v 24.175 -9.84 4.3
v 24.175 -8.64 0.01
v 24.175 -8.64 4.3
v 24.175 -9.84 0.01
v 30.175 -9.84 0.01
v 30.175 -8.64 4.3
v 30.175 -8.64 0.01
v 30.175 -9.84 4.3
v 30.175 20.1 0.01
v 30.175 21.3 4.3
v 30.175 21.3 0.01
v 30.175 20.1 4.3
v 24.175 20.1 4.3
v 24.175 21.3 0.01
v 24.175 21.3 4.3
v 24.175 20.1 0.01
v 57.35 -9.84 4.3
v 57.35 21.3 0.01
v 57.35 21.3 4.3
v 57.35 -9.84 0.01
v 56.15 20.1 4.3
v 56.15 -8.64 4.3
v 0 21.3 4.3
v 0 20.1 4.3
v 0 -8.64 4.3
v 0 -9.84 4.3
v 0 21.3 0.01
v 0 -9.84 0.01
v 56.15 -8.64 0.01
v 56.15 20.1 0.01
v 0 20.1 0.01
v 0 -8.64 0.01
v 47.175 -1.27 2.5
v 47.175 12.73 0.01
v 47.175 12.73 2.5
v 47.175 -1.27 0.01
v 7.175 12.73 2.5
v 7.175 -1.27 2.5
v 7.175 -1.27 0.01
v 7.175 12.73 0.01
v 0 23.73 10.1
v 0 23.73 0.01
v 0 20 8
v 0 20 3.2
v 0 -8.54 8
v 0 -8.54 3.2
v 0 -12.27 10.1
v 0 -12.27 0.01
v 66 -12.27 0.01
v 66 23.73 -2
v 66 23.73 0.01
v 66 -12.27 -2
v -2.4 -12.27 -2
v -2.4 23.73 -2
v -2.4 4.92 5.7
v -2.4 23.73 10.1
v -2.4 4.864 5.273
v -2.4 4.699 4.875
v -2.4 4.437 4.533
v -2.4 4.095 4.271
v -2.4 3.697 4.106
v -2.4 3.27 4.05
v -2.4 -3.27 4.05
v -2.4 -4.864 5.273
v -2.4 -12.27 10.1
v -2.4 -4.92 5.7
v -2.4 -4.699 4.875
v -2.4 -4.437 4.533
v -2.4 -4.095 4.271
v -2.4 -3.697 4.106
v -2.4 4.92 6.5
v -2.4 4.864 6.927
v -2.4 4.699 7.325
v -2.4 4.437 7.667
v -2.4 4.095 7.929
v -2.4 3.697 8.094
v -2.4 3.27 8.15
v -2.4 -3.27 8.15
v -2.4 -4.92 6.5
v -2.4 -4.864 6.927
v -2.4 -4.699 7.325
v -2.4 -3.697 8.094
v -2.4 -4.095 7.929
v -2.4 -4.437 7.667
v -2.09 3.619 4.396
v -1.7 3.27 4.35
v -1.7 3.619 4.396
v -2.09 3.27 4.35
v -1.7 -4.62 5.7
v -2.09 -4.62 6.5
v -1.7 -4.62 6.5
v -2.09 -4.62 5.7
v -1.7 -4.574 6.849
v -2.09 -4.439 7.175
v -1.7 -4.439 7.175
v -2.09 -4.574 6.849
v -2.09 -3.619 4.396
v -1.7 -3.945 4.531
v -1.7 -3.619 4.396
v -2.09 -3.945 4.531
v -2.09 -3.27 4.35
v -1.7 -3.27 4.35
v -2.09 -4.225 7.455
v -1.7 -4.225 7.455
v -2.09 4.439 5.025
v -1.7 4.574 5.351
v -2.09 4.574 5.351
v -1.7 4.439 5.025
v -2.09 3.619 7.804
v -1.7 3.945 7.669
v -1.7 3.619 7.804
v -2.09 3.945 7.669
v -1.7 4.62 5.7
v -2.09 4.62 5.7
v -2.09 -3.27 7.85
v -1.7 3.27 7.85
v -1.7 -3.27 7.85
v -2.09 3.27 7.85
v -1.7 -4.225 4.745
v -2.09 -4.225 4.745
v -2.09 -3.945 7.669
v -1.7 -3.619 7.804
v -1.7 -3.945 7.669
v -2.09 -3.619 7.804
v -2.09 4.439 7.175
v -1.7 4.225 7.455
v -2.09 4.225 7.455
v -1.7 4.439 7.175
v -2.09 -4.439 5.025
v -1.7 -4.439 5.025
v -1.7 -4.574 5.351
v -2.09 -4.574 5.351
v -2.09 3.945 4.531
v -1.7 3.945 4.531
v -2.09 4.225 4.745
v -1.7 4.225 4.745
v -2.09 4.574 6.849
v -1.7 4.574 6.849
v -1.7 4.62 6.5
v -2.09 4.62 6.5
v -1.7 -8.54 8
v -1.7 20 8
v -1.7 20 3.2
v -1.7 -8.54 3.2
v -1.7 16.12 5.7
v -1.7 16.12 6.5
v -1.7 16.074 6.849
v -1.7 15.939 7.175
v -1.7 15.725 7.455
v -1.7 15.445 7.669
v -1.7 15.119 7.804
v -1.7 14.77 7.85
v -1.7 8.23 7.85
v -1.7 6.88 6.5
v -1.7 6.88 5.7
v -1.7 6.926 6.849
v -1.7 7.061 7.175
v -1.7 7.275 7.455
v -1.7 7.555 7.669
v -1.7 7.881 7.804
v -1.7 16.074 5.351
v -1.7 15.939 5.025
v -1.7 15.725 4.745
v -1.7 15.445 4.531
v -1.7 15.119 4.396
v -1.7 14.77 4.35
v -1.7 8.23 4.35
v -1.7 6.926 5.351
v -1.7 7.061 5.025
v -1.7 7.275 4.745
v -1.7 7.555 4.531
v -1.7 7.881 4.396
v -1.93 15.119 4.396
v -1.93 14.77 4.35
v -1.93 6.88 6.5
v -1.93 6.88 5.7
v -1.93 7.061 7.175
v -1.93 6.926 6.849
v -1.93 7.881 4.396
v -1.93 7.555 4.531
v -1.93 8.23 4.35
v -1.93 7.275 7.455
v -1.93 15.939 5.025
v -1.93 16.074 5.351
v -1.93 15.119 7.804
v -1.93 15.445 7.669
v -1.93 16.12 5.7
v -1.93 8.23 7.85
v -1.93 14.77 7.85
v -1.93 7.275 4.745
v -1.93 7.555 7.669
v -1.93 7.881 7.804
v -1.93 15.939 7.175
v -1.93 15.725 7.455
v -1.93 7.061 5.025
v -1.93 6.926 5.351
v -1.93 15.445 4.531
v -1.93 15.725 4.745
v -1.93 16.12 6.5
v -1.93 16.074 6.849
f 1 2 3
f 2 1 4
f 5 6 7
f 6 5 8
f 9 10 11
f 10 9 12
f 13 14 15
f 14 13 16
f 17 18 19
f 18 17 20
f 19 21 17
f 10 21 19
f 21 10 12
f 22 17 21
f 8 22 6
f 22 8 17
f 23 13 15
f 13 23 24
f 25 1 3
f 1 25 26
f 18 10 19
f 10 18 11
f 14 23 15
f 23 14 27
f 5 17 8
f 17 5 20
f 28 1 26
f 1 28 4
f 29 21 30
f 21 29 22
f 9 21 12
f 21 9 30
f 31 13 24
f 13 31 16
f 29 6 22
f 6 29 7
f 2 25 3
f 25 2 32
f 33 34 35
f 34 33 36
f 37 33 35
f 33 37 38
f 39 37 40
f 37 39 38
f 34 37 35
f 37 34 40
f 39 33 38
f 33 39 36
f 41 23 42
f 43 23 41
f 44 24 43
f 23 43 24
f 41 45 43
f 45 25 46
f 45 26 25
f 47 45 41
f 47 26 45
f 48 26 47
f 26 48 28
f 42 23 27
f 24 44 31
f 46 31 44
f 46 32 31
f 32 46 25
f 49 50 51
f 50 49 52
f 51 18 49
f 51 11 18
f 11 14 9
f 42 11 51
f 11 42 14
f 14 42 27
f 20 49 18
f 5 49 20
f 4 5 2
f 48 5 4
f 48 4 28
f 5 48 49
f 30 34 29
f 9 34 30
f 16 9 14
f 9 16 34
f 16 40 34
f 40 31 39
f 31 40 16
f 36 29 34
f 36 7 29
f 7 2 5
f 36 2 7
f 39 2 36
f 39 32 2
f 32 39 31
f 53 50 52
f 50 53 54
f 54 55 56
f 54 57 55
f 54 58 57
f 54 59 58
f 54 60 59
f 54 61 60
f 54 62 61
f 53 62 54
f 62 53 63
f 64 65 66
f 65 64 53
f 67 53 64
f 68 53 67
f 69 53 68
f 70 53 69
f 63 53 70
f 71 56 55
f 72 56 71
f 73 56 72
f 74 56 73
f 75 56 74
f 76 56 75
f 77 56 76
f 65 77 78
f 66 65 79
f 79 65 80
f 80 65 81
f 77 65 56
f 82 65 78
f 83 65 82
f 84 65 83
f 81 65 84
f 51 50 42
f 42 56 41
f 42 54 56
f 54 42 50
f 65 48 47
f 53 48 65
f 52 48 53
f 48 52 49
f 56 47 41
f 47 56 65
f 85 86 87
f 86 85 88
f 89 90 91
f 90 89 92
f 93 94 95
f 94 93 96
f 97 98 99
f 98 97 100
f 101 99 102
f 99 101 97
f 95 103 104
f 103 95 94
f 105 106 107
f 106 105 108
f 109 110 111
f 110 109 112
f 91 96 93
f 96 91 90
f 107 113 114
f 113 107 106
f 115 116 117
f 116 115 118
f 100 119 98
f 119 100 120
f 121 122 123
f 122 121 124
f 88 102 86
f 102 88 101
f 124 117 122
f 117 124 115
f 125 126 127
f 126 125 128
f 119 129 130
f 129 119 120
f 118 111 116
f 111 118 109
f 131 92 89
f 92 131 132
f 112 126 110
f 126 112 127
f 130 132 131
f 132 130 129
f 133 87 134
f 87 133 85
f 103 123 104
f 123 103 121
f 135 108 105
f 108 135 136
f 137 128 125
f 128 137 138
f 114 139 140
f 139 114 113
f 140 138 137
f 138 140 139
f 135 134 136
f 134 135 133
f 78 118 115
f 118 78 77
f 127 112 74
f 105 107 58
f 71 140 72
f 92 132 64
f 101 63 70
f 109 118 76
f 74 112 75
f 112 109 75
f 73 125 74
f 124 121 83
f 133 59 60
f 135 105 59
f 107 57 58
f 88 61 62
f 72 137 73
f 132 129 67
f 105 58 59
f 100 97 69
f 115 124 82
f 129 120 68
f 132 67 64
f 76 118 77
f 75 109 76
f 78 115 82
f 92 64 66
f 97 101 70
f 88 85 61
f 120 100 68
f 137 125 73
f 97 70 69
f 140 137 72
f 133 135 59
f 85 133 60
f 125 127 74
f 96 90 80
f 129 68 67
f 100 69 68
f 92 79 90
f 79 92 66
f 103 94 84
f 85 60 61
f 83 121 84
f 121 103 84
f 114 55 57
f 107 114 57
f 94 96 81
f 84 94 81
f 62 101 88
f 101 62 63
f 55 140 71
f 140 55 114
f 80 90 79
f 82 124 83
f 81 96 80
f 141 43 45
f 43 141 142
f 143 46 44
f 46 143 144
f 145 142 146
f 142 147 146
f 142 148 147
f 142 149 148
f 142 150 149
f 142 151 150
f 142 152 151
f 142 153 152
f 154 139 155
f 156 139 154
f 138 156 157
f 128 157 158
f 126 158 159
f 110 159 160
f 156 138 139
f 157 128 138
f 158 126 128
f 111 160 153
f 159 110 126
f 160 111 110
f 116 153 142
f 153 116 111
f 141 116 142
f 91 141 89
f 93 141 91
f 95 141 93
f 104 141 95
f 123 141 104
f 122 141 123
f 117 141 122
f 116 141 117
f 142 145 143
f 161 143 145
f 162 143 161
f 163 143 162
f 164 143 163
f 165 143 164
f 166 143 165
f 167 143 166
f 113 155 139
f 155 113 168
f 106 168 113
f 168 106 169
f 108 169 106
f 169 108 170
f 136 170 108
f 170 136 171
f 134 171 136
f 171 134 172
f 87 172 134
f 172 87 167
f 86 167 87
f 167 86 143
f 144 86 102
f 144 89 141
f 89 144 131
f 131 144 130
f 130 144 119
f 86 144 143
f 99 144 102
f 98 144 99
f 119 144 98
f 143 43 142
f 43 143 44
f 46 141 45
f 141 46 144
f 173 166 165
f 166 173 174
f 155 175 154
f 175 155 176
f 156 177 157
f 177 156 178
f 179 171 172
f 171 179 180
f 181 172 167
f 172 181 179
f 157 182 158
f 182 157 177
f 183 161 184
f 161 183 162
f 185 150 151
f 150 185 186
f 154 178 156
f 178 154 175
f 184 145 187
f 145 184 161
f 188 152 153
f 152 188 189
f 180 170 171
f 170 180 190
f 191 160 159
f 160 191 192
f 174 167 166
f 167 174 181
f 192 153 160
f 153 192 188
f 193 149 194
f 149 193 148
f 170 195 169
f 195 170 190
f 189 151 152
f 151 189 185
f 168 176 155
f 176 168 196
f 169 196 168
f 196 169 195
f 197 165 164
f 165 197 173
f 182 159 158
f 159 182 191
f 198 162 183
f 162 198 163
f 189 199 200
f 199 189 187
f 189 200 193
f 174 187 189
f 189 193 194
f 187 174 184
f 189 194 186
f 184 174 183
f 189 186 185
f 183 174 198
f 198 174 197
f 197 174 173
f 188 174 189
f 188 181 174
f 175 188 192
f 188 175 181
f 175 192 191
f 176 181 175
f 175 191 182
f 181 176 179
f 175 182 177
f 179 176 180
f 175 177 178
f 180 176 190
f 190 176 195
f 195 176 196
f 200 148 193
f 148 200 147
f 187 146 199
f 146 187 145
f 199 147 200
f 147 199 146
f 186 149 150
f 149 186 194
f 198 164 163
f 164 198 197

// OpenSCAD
// file: ../../usb-c-port/usb-c-port.scad
//-----------------------------------------------------------------------
// USB-C port through a wall, flush: the socket's metal shell sits in a
// close-fitting pocket in the wall, walled in on all four sides, its face
// level with the outside. The cable seats the way it does on a laptop.
//
// A board's socket only overhangs the board edge by a mm or so, less than
// the wall. So the board's end tucks into a shallow relief in the wall's
// inner face, the width of the board, leaving the wall round the socket
// thin enough for the face to reach the outside. When that would leave less
// than usbcMinWall (a socket that barely overhangs), the face sits back from
// the outside instead: usbcRecess() says how far.
//
// Modules, all in the same frame:
//   usbcGhost()     the socket and the board's end, for previews
//   usbcWallCut()   subtract from the wall: socket pocket and board relief
//
// Frame: origin on the floor top at the wall's inner face, under the socket's
// axis. +X into the box, Z up. The wall is X = -wall .. 0. The board is
// component side up, socket on top (top-mount, as on the FireBeetle, C3 Super
// Mini and S3 DevKitC). Units: mm.
//
// usbcBoardEdgeX() gives where the board's edge lands (negative: inside the
// wall), so a holder can put its posts or pocket to match.
//-----------------------------------------------------------------------

//-- The socket: USB-C receptacle shell (USB-IF 8.34 x 2.56 plug, receptacle shell ~8.94 x 3.26)
usbcShellW     = 8.94;
usbcShellH     = 3.26;    // CAL per board: measured 3.2 on the FireBeetle
usbcShellR     = 1.2;     // CAL: end radius. Full round would be 1.63; most shells are squarer
usbcShellDepth = 7.35;    // face to back

//-- The pocket
usbcClearance  = 0.15;    // CAL: per side, shell to pocket. Set by the fit piece
usbcMinWall    = 1.0;     // thinnest wall left round the socket
usbcReliefGap  = 0.3;     // board relief over the board, each side and above/below
usbcChamfer    = 0.3;     // lead-in on the outside edge

//-- How far the socket face sits back from the outside: 0 (flush) unless the socket
//-- overhangs the board edge by less than usbcMinWall
function usbcRecess(overhang, minWall = usbcMinWall) = max(0, minWall - overhang);
//-- X of the board's socket edge in this frame
function usbcBoardEdgeX(wall, overhang, recess) =
  -wall + (is_undef(recess) ? usbcRecess(overhang) : recess) + overhang;
//-- Z of the board's underside above the floor top
function usbcBoardZ(axisZ, pcb, shellH = usbcShellH) = axisZ - shellH/2 - pcb;

module usbcShell2D(grow = 0, w = usbcShellW, h = usbcShellH, r = usbcShellR)
{
  offset(r = r + grow, $fn = 24) square([w - 2*r, h - 2*r], center = true);
}

//-- axisZ: socket axis above the floor. boardW/pcb: the board, for the ghost and relief.
//-- shift: socket centre across the board's width from the board's centre line (+Y)
module usbcGhost(axisZ, wall, overhang, boardW, pcb = 1.6, recess, shift = 0, shellH = usbcShellH, shellW = usbcShellW)
{
  ex = usbcBoardEdgeX(wall, overhang, recess);
  %color("Silver") translate([ex - overhang, 0, axisZ]) rotate([0, 90, 0]) rotate([0, 0, 90])
    linear_extrude(usbcShellDepth) usbcShell2D(w = shellW, h = shellH);
  %color("DarkSlateGray") translate([ex, -boardW/2 - shift, usbcBoardZ(axisZ, pcb, shellH)]) cube([12, boardW, pcb]);
}

module usbcWallCut(axisZ, wall, overhang, boardW, pcb = 1.6, recess, shift = 0,
                   clearance = usbcClearance, shellH = usbcShellH, shellW = usbcShellW, aboveBoard)
{
  rc = is_undef(recess) ? usbcRecess(overhang) : recess;
  ex = usbcBoardEdgeX(wall, overhang, rc);
  bz = usbcBoardZ(axisZ, pcb, shellH);
  //-- what stands on the board near its edge: the socket, unless told taller
  up = is_undef(aboveBoard) ? shellH : aboveBoard;
  assert(ex - overhang + wall >= -0.01, "socket face would stand proud of the wall");
  assert(rc > 0 || overhang >= usbcMinWall - 0.01, "wall round the socket under usbcMinWall");
  //-- socket pocket, through the wall
  translate([-wall - 1, 0, axisZ]) rotate([0, 90, 0]) rotate([0, 0, 90])
    linear_extrude(wall + 2) usbcShell2D(clearance, w = shellW, h = shellH);
  //-- lead-in chamfer on the outside
  translate([-wall, 0, axisZ]) rotate([0, 90, 0]) rotate([0, 0, 90])
    hull()
    {
      translate([0, 0, -0.01]) linear_extrude(0.01) usbcShell2D(clearance + usbcChamfer, w = shellW, h = shellH);
      translate([0, 0, usbcChamfer]) linear_extrude(0.01) usbcShell2D(clearance, w = shellW, h = shellH);
    }
  //-- board relief in the inner face, when the board's edge lands inside the wall
  if (ex < 0)
    translate([ex - usbcReliefGap, -boardW/2 - shift - usbcReliefGap, bz - usbcReliefGap])
      cube([-ex + usbcReliefGap + 1, boardW + 2*usbcReliefGap, pcb + up + 2*usbcReliefGap]);
}
// file: ../../board-pocket/board-pocket.scad
//-----------------------------------------------------------------------
// Board pocket: holds a board that has no mounting holes
//
// The board sits on a central pedestal with a pad of double-sided foam tape
// on top, inside a low wall that follows its outline. The pedestal keeps
// the board's edges off the floor, so lead stubs soldered through the edge
// holes have room underneath; gaps in the wall let the leads out. The wall
// only locates the board: the tape holds it down, and in a closed box a lid
// pad presses a pad of foam onto it (boardLidPad below).
//
// Modules, all in the same frame:
//   boardPocketGhost()   the board and its tape, for previews
//   boardPocketHolder()  the plastic: pedestal and outline wall, add to the floor
//   boardLidPad()        a block hanging from the lid that presses foam onto the board
//   boardLidPadGhost()   the foam under it, squashed, for previews
//
// Frame: origin on the floor top, under the centre of the board's outline.
// X along the board's length l, Y across its width w, Z up. Units: mm.
//
// Sides are listed [-X, +X, -Y, +Y], each one of
//   "gap"    wall with a gap in the middle for leads (gapW wide)
//   "solid"  whole wall: use it where the board takes a push (a plug)
//   "open"   no wall: the board's edge goes into a box wall (a USB port)
//
// Used by esp32-c3-supermini, esp32-s3-devkitc and rs485-max485.
//-----------------------------------------------------------------------

//-- From the controller project's receiver.scad / rack-end.scad (boardPocket), 2026-10-30
bpPedestal  = 2.5;     // floor to the tape: room for lead stubs under the board edges
bpTape      = 1.0;     // double-sided foam tape on the pedestal. CAL: how far it squashes
bpWall      = 1.2;     // outline wall thickness
bpRise      = 1.0;     // wall top above the PCB underside (the controller project's rack-end: 0.8 under the S3's module)
bpClearance = 0.4;     // per side, board outline to wall: PETG. 0.3 for PLA. Set by the fit piece
bpGapW      = 6;       // lead gap in a "gap" side
bpPadInset  = 4;       // default pedestal: the board less this all round

//-- Lid hold-down (the controller project's receiver / rack-end lid pads)
bpFoam      = 3.0;     // CAL: self-adhesive foam stuck under each lid pad
bpSqueeze   = 1.0;     // how far the lid squashes it: ~1/3 for soft foam, 0.3 for felt

//-- PCB underside above the floor top
function boardPocketZ(pedestal = bpPedestal, tape = bpTape) = pedestal + tape;
//-- default pedestal [l, w] for a board
function boardPocketPad(l, w, inset = bpPadInset) = [max(l - 2*inset, 4), max(w - 2*inset, 4)];
//-- Z of a lid pad's underside, pressing on a surface at surfaceZ (board top, or a part on it)
function boardLidPadZ(surfaceZ, foam = bpFoam, squeeze = bpSqueeze) =
  assert(squeeze > 0 && squeeze < foam, "foam would not touch the board")
  surfaceZ + foam - squeeze;

function bpSides4(s) = is_list(s) ? s : [s, s, s, s];

module boardPocketGhost(l, w, pcb = 1.6, pad, pedestal = bpPedestal, tape = bpTape)
{
  p = is_undef(pad) ? boardPocketPad(l, w) : pad;
  %color("White") translate([-p[0]/2, -p[1]/2, pedestal]) cube([p[0], p[1], tape]);
  %color("DarkGreen") translate([-l/2, -w/2, pedestal + tape]) cube([l, w, pcb]);
}

//-- pad: pedestal [l, w]; gapW a number or one per side
module boardPocketHolder(l, w, pad, sides = "gap", gapW = bpGapW, clearance = bpClearance,
                         pedestal = bpPedestal, tape = bpTape, wall = bpWall, rise = bpRise)
{
  p   = is_undef(pad) ? boardPocketPad(l, w) : pad;
  s   = bpSides4(sides);
  g   = bpSides4(gapW);
  ix  = l/2 + clearance;                 // inner half sizes
  iy  = w/2 + clearance;
  top = pedestal + tape + rise;
  assert(p[0] <= l && p[1] <= w, "pedestal bigger than the board");
  for (k = s) assert(k == "gap" || k == "solid" || k == "open", str("unknown side ", k));

  //-- pedestal, centred under the board
  translate([-p[0]/2, -p[1]/2, -0.01]) cube([p[0], p[1], pedestal + 0.01]);
  //-- outline wall
  difference()
  {
    translate([-ix - wall, -iy - wall, -0.01]) cube([2*(ix + wall), 2*(iy + wall), top + 0.01]);
    translate([-ix, -iy, -1]) cube([2*ix, 2*iy, top + 2]);
    for (i = [0 : 3])
    {
      //-- each side's cut, drawn for -X then turned into place
      ax = (i < 2) ? ix : iy;         // inner half size across the side
      al = (i < 2) ? iy : ix;         // half length along it
      rotate([0, 0, [0, 180, 90, 270][i]])   // -X, +X, -Y, +Y
      {
        if (s[i] == "gap")
          translate([-ax - wall - 1, -g[i]/2, -1]) cube([wall + 2, g[i], top + 2]);
        if (s[i] == "open")
          translate([-ax - wall - 1, -al - wall - 1, -1]) cube([wall + 1.01, 2*(al + wall + 1), top + 2]);
      }
    }
  }
}

//-- A lid pad over the rectangle size [x, y] centred at `at`, from the squashed foam up to
//-- lidZ (the lid's inner face in this frame), running `into` up into the lid plate
module boardLidPad(size, at = [0, 0], surfaceZ, lidZ, foam = bpFoam, squeeze = bpSqueeze, into = 0.5)
{
  z0 = boardLidPadZ(surfaceZ, foam, squeeze);
  assert(lidZ > z0, "lid is below the pad: the box is too low for the foam");
  translate([at[0] - size[0]/2, at[1] - size[1]/2, z0]) cube([size[0], size[1], lidZ - z0 + into]);
}

module boardLidPadGhost(size, at = [0, 0], surfaceZ, foam = bpFoam, squeeze = bpSqueeze)
{
  %color("Gray") translate([at[0] - size[0]/2, at[1] - size[1]/2, surfaceZ]) cube([size[0], size[1], foam - squeeze]);
}
// main file
// One holder on a piece of wall and floor, for the catalogue: YD clone, right-hand port open.
use <../esp32-s3-devkitc.scad>

wall = 2.4;
ly   = s3DevkitLeftY();
cy   = ly - s3Devkit()[2]/2;
difference()
{
  union()
  {
    translate([-wall, cy - 18, -2]) cube([wall + 66, 36, 2.01]);
    translate([-wall, cy - 18, 0]) cube([wall, 36, s3DevkitAxisZ() + 4]);
    s3DevkitHolder(wall);
  }
  s3DevkitWallCut(wall);
}
